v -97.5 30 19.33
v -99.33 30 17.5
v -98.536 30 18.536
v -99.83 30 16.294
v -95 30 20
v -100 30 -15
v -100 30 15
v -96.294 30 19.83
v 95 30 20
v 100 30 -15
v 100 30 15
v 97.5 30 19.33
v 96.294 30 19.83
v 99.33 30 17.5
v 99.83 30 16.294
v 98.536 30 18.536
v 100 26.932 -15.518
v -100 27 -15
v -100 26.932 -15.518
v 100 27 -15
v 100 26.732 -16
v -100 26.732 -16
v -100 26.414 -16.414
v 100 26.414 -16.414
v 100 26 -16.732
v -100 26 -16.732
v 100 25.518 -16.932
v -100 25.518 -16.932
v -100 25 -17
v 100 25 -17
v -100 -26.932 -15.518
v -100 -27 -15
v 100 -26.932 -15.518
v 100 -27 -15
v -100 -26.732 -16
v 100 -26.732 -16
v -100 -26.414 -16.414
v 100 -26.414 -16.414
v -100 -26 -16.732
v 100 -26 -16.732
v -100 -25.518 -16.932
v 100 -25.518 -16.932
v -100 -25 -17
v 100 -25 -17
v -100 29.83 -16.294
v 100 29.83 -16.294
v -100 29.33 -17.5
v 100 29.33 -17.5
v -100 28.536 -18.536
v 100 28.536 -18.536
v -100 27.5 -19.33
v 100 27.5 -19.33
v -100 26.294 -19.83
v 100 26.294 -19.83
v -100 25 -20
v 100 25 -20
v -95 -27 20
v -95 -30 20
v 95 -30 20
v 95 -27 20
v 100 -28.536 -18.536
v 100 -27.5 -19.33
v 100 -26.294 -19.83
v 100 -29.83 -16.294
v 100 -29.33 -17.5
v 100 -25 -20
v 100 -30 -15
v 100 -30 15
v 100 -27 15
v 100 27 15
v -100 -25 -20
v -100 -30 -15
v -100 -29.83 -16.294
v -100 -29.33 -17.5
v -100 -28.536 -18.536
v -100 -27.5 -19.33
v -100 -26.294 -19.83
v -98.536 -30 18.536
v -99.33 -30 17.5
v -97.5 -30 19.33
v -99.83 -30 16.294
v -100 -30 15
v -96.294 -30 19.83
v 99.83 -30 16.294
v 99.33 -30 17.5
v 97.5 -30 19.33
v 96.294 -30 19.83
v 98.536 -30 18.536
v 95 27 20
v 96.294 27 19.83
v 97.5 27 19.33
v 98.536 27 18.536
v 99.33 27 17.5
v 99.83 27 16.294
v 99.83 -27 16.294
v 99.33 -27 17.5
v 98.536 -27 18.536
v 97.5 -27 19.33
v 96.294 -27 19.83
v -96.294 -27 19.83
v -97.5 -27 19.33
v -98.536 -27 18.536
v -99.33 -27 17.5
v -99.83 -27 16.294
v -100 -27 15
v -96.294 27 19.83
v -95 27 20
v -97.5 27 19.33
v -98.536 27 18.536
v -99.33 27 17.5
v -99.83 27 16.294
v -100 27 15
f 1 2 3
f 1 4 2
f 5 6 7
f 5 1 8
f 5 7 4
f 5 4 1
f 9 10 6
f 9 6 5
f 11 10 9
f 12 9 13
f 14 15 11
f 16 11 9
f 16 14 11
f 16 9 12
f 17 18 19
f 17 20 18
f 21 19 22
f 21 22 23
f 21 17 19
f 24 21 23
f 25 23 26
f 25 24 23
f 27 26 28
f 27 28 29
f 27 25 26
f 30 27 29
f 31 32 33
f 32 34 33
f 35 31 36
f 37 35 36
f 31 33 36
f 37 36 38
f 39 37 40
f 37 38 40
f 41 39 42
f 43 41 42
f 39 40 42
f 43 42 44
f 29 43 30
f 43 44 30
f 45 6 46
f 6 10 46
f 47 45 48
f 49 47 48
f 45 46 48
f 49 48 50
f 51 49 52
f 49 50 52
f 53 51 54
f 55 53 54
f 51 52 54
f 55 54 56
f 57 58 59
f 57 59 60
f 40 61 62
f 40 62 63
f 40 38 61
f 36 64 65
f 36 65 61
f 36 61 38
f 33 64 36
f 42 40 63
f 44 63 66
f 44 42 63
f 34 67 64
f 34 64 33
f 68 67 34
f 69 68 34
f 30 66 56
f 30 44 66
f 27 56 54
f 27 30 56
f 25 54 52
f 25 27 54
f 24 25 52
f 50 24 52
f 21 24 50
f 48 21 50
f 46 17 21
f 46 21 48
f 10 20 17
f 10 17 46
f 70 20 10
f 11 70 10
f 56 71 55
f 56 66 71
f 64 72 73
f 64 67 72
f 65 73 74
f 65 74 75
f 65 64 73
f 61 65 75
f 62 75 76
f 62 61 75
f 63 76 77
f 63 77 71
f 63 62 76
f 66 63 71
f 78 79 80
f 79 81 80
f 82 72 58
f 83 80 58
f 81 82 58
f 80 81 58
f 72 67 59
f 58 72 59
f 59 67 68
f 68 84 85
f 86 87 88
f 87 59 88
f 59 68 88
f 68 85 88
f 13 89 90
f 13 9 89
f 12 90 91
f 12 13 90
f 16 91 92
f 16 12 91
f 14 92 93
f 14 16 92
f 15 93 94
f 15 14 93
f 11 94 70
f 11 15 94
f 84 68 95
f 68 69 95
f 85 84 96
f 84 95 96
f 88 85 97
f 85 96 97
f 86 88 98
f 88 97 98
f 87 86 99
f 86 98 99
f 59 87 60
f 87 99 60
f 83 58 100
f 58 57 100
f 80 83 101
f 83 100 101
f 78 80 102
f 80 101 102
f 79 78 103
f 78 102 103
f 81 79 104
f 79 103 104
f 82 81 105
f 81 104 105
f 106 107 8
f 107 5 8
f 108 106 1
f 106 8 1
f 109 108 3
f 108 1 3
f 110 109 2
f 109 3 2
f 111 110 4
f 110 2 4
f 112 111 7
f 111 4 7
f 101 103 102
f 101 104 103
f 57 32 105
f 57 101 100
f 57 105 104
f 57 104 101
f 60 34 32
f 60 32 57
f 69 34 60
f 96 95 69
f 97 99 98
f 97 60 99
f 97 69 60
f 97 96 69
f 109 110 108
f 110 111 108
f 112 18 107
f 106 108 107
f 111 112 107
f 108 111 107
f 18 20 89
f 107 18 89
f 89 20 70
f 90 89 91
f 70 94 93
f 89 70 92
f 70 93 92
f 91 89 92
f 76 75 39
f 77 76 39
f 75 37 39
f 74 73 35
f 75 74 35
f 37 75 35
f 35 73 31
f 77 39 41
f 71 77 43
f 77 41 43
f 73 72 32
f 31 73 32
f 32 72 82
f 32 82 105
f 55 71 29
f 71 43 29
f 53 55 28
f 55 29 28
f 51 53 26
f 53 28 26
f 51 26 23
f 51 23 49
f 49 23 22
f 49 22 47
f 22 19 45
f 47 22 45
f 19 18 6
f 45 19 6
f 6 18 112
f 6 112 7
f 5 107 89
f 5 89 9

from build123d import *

# Parameters (mm, degrees)
F0_W     = 60
F0_H     = 40
F1_DEPTH = 100
F2_R     = 5
F3_T     = -3
F4_R     = 5


with BuildPart() as f1:
    # F0 (on Right) → F1 (new body, symmetric)
    with BuildSketch(Plane.YZ):
        Rectangle(F0_W, F0_H)
    extrude(amount=F1_DEPTH, both=True)

    # F2
    f2_edges = [f1.edges().sort_by_distance(p)[0] for p in [
        (0, -30, -20),
        (0, 30, -20),
    ]]
    fillet(f2_edges, radius=F2_R)

    # F3
    f3_openings = [f1.faces().sort_by_distance(p)[0] for p in [
        (0, 0, 20),
        (100, 0, 0.084803),
        (-100, 0, 0.084803),
    ]]
    offset(amount=F3_T, openings=f3_openings)

    # F4
    f4_edges = [f1.edges().sort_by_distance(p)[0] for p in [
        (-100, 28.5, 20),
        (-100, -28.5, 20),
        (100, 28.5, 20),
        (100, -28.5, 20),
    ]]
    fillet(f4_edges, radius=F4_R)


solid = f1.part
